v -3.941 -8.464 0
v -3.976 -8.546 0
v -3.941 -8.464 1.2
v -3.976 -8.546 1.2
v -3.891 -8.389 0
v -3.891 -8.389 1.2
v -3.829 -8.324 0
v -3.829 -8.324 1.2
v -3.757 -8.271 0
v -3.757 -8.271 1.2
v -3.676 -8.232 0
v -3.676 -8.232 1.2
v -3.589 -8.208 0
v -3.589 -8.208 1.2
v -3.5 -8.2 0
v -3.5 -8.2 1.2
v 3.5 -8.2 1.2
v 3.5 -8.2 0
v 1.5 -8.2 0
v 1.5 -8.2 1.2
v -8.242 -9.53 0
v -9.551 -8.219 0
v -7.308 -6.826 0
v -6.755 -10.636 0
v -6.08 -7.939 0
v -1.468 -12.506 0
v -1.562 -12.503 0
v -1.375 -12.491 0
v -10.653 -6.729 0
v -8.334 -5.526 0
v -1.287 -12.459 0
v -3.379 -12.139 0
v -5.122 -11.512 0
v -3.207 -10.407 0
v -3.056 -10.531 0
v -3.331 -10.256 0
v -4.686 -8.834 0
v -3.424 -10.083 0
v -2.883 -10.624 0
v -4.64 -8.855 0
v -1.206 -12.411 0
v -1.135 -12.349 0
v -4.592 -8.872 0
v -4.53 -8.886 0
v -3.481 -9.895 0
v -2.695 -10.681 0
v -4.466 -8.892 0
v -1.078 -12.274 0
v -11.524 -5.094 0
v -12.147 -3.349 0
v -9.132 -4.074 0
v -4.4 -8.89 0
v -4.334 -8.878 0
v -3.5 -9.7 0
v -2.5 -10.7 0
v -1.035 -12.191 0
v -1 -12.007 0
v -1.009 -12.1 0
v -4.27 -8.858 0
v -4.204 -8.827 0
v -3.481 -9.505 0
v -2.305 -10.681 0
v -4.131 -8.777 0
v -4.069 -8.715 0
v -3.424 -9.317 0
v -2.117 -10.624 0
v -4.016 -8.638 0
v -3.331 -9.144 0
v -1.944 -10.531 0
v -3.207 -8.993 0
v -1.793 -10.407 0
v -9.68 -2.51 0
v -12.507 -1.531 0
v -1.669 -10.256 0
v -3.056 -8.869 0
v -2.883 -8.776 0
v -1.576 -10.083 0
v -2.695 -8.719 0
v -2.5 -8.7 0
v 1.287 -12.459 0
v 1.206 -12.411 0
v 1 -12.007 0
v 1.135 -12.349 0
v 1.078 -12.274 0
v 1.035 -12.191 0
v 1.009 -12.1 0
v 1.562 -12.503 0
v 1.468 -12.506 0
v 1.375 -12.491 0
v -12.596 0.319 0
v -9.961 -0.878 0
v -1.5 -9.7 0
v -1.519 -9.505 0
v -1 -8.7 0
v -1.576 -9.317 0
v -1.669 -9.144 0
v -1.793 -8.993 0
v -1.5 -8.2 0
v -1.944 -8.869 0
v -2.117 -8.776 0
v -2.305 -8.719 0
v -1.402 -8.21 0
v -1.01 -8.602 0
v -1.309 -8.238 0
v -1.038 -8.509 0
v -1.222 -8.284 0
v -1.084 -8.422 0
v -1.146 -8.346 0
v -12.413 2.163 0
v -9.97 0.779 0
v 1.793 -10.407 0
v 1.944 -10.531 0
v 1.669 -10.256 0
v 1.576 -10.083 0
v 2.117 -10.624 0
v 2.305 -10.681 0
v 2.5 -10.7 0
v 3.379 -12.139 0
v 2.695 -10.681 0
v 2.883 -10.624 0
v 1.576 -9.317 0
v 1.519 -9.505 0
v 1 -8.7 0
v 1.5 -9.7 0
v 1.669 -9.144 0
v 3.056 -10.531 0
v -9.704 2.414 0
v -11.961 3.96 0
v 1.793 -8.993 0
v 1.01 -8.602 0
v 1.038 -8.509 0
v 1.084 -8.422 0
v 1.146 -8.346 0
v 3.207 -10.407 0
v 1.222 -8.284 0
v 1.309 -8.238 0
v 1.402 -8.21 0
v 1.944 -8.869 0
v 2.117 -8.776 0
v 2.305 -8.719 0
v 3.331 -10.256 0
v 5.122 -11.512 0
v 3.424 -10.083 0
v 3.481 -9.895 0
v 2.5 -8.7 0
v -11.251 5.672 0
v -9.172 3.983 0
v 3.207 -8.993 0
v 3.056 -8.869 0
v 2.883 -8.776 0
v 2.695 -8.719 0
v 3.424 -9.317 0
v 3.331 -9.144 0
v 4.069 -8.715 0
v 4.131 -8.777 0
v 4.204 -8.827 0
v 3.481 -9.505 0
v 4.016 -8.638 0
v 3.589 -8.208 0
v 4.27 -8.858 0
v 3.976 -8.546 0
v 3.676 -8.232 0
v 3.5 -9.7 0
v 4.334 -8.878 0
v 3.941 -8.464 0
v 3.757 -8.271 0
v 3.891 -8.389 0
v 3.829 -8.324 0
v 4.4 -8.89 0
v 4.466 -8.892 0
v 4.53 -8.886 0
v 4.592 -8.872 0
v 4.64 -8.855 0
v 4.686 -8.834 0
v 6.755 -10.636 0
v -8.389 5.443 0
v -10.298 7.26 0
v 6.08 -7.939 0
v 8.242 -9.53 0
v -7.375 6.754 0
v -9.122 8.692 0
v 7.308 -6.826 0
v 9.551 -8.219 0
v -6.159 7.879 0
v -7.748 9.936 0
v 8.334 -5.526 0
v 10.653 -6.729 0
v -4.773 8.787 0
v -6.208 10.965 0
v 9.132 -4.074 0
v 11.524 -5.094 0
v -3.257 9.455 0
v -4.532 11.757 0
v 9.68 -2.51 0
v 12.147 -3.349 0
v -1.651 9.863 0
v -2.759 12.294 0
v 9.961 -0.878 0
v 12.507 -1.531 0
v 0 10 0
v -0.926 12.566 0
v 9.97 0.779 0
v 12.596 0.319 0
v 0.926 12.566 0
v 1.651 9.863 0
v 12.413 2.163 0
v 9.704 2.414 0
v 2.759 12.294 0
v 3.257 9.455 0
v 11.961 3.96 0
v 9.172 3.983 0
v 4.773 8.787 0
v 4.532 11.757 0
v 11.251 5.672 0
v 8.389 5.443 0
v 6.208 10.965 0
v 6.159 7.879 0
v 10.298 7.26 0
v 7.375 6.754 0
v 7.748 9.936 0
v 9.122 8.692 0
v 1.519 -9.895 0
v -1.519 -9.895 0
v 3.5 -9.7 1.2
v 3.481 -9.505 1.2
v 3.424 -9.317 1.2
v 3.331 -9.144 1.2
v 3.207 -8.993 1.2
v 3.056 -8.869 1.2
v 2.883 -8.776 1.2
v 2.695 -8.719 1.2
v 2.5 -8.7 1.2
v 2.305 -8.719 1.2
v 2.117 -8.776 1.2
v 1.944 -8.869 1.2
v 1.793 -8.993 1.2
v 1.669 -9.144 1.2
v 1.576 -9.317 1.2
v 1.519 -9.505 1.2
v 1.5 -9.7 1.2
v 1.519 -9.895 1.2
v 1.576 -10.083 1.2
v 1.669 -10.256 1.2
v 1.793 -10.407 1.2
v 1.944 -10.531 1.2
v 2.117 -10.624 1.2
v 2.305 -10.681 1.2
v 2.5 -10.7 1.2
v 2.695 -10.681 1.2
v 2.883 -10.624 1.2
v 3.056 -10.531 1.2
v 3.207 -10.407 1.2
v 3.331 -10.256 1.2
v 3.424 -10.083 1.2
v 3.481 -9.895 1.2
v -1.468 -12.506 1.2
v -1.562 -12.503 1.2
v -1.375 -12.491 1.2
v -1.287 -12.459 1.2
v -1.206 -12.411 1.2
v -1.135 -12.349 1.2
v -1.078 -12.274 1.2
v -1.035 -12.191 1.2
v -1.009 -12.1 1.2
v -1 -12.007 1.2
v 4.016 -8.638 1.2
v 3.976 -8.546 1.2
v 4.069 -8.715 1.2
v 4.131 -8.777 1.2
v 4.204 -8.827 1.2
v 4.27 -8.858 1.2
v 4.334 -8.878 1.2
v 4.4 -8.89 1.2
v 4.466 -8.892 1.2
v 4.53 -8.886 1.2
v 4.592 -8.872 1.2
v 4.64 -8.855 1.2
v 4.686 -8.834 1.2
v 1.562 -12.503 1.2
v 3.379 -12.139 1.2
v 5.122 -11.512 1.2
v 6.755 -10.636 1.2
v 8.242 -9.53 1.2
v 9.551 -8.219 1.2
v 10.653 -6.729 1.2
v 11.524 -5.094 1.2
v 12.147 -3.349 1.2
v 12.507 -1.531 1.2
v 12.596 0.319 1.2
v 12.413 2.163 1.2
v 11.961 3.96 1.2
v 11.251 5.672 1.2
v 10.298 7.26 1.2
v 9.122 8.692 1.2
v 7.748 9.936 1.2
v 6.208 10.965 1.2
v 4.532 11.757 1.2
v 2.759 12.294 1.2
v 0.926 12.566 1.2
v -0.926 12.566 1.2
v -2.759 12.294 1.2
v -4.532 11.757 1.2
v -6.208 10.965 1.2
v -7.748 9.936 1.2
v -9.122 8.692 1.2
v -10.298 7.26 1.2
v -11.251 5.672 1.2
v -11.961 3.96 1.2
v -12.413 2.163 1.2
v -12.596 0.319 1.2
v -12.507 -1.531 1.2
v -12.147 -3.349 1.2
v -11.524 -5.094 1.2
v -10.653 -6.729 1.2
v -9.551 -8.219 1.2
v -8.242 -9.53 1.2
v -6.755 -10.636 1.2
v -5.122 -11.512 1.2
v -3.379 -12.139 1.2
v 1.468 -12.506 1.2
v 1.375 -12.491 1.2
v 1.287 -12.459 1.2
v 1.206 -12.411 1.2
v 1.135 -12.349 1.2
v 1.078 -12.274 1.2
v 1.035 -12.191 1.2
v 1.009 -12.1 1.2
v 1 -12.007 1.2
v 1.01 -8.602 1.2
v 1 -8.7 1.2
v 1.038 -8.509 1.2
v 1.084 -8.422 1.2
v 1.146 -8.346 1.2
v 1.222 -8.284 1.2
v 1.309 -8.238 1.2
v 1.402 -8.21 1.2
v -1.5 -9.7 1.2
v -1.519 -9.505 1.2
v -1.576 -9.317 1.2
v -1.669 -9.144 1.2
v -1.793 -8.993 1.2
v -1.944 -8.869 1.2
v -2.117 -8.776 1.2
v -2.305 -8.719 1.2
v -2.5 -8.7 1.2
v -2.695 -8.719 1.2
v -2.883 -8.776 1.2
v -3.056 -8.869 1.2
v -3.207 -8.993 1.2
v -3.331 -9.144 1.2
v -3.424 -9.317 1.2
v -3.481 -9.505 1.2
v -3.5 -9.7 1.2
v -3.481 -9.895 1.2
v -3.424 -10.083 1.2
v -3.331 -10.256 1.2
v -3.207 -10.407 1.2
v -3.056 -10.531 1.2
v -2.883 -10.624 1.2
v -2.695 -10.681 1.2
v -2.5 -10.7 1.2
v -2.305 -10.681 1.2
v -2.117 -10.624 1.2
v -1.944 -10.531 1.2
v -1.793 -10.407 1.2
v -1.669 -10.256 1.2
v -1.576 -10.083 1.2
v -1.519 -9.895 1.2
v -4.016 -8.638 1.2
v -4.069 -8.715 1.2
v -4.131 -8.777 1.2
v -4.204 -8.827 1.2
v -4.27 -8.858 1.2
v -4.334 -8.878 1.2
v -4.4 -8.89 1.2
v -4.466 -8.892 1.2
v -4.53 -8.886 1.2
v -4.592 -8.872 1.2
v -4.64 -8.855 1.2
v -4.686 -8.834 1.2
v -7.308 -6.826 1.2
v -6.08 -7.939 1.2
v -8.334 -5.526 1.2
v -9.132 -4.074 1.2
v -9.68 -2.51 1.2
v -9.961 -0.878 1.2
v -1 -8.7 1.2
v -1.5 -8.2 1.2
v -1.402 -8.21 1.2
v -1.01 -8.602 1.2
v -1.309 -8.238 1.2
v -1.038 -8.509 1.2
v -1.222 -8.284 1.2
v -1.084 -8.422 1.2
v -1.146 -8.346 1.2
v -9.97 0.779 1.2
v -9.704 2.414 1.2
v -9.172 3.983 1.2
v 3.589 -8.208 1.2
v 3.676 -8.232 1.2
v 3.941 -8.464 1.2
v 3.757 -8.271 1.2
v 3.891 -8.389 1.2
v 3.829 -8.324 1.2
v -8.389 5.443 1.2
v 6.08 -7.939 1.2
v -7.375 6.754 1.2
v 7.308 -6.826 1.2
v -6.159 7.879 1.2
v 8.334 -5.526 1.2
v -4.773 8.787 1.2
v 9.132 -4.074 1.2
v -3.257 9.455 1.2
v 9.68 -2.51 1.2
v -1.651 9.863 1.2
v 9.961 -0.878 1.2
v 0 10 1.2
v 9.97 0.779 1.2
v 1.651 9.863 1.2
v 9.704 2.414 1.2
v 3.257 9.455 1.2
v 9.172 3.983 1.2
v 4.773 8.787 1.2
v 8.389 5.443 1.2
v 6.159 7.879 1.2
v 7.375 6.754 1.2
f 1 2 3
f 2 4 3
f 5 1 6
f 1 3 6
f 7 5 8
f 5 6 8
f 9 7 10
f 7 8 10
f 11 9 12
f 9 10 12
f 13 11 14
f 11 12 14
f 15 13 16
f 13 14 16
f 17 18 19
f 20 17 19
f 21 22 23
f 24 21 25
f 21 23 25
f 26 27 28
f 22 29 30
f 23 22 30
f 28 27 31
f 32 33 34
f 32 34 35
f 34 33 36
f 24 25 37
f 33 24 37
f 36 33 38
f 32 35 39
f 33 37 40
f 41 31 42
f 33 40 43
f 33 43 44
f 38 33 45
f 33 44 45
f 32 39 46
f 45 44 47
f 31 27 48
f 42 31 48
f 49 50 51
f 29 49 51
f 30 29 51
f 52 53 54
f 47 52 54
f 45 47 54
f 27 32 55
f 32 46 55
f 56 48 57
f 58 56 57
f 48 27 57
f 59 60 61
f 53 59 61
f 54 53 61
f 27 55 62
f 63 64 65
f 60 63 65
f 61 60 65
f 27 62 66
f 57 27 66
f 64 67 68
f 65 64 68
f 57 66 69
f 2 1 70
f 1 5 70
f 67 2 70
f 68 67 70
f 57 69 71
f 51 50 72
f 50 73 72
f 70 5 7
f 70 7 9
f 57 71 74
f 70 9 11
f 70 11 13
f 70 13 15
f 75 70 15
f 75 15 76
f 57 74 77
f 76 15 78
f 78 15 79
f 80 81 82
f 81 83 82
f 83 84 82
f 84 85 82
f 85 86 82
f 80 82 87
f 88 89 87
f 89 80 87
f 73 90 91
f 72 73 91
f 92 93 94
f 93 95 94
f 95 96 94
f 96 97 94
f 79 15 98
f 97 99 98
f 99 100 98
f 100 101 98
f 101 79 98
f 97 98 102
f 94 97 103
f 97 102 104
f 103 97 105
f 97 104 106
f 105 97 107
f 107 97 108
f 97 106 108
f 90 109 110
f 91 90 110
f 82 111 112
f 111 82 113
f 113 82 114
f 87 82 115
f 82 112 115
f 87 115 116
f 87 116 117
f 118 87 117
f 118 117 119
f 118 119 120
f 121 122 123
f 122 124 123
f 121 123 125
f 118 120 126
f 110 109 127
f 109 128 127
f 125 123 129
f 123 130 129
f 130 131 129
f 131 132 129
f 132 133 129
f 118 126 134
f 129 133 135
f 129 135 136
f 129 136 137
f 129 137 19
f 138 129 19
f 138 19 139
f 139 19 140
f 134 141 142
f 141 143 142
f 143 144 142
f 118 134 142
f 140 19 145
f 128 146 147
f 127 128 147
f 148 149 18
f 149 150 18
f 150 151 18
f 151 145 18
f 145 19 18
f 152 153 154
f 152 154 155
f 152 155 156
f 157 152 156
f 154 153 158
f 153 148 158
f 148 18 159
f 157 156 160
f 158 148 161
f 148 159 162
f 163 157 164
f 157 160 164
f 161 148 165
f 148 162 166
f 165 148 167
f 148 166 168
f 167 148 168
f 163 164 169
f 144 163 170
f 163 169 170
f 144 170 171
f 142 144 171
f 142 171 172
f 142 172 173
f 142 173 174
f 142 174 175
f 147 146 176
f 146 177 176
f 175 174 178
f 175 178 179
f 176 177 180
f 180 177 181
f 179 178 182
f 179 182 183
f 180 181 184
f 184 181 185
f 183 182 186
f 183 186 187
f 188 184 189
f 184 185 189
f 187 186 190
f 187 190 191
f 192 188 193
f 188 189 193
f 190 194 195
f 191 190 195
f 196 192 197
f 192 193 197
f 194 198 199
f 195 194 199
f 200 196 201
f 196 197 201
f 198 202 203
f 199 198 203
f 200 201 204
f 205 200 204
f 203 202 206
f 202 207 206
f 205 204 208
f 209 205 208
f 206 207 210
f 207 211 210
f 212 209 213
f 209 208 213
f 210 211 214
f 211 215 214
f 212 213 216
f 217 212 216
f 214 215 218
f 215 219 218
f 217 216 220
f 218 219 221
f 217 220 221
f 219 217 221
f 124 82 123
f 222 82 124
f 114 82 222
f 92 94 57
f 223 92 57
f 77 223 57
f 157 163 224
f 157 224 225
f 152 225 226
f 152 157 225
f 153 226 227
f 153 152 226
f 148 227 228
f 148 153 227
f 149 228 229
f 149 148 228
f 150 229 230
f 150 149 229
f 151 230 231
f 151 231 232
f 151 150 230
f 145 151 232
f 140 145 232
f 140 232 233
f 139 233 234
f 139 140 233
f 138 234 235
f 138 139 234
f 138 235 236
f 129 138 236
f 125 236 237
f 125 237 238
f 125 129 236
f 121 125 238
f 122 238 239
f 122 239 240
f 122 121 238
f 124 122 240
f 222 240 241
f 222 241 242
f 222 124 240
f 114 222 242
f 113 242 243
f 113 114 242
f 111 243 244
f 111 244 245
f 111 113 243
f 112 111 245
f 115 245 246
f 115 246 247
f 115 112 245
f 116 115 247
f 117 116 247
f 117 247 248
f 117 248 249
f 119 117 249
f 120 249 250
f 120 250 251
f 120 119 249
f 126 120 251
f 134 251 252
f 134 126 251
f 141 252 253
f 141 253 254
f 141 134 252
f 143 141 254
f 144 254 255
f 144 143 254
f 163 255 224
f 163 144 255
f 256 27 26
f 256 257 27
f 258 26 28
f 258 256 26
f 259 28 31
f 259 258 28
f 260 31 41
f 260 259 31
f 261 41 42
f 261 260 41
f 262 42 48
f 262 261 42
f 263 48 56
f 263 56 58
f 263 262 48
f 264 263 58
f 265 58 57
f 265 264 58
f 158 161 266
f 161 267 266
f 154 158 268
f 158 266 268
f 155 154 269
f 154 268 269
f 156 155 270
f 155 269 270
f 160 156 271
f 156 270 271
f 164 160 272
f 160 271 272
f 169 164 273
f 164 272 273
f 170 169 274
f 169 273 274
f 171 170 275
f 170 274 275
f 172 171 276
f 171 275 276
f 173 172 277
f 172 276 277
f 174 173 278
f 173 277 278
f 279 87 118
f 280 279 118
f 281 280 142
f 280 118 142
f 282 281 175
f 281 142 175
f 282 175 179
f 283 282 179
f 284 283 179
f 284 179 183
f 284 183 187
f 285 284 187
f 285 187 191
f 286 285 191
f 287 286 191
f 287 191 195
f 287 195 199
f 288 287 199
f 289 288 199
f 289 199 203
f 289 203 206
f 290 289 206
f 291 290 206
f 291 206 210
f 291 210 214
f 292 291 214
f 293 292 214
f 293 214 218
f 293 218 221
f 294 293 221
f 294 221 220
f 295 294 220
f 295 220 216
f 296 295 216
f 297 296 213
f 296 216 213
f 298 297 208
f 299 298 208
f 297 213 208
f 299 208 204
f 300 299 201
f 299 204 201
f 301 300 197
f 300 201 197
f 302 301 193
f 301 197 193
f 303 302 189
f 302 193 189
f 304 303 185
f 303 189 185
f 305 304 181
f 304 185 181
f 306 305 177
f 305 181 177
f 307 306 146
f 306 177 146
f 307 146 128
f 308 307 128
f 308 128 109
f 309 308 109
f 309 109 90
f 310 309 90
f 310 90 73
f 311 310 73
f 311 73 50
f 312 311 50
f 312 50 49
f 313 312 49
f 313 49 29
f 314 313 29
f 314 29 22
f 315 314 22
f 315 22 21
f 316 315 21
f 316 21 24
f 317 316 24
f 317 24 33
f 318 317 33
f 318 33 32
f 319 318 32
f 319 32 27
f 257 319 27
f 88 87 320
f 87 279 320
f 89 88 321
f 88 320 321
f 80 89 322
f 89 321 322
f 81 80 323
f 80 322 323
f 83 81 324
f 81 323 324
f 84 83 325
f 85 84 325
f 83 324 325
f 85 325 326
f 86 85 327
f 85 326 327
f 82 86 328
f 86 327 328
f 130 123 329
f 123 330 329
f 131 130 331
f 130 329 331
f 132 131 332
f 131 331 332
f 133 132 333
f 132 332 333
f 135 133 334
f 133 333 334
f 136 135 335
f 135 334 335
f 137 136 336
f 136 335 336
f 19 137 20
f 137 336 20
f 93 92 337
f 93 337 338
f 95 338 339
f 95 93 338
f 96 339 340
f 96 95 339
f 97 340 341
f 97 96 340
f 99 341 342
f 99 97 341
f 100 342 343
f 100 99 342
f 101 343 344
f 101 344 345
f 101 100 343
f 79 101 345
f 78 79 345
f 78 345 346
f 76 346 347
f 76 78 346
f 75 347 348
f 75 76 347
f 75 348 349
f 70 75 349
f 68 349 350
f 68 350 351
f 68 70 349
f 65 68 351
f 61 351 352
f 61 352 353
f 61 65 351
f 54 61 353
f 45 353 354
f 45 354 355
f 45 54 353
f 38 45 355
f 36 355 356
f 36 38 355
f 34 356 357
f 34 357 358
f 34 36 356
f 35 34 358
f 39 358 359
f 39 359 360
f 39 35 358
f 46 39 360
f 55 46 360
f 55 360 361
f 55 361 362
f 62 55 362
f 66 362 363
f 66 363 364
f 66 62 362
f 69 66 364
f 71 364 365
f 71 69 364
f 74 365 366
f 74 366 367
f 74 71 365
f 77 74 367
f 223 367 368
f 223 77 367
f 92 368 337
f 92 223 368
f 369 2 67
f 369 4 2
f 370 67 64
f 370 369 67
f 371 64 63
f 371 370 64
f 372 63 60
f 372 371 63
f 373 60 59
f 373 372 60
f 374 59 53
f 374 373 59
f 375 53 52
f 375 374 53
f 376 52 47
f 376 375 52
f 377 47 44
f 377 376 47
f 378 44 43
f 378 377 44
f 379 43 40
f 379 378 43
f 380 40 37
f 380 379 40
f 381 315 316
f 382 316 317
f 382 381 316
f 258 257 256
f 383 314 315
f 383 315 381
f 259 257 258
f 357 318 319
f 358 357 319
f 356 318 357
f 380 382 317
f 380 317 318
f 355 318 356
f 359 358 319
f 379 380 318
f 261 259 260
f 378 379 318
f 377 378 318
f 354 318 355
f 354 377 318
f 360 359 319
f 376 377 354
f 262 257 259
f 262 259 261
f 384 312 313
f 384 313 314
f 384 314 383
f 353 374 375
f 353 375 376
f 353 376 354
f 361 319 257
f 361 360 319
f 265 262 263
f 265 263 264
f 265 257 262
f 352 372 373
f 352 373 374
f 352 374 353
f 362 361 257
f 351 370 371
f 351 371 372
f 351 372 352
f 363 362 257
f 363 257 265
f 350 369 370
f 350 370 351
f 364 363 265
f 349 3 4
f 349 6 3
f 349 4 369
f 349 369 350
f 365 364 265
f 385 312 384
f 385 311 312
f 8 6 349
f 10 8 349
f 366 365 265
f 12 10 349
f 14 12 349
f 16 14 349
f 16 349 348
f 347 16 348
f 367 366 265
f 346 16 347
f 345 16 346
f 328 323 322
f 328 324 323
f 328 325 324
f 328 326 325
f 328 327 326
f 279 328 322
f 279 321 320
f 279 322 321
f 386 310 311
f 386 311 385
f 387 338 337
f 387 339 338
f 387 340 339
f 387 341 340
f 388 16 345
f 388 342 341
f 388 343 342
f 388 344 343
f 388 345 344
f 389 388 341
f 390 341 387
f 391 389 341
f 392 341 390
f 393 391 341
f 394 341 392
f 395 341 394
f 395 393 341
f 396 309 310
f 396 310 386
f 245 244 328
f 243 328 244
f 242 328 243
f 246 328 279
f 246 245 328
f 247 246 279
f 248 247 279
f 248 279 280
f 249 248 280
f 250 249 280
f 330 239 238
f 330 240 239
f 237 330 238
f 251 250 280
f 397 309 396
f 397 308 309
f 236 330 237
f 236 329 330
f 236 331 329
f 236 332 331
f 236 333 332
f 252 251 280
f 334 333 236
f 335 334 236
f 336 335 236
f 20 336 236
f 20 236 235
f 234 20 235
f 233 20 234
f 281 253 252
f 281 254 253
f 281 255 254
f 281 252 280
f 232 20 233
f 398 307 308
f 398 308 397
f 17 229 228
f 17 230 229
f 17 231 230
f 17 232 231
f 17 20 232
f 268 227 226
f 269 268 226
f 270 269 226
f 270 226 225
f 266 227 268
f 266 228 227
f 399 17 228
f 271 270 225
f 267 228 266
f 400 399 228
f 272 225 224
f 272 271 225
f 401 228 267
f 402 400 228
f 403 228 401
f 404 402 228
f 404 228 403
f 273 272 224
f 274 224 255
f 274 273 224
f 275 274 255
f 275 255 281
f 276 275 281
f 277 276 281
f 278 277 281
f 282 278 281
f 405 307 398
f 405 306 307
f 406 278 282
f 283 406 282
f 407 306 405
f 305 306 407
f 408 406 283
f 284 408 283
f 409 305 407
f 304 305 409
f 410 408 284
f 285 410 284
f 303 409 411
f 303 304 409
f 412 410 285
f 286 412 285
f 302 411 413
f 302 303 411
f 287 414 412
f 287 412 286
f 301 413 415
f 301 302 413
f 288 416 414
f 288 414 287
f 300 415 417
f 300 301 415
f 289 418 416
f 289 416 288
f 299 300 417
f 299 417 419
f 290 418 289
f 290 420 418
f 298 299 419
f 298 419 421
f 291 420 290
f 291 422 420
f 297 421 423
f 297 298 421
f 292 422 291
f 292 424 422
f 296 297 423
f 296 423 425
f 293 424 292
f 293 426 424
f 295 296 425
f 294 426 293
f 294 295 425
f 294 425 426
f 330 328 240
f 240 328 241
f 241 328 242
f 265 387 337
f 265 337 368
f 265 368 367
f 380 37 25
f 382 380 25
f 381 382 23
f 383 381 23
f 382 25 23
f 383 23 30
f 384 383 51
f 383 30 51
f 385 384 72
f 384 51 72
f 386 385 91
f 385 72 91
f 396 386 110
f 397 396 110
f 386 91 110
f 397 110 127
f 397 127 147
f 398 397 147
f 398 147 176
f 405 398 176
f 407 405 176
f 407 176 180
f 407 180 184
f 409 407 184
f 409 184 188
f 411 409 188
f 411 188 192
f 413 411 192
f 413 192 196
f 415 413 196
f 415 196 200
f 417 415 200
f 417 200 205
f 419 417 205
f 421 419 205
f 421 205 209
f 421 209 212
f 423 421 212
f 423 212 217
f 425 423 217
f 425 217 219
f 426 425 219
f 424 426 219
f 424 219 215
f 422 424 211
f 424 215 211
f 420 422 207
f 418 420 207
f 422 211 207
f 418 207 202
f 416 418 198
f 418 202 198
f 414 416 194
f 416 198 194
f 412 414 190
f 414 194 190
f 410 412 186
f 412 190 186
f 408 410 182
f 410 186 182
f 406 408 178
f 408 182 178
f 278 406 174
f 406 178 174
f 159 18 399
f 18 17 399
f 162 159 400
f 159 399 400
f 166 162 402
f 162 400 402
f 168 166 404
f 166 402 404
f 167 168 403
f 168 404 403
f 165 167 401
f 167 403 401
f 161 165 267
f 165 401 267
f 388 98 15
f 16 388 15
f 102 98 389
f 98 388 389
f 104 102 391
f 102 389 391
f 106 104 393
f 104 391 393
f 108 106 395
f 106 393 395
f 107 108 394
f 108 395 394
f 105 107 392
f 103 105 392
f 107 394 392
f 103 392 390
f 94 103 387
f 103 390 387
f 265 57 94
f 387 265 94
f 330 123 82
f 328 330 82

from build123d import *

# Parameters (mm, degrees)
SZKIC1_R                    = 1
DODANIE_WYCI_GNI_CIE1_DEPTH = 1.2
ZAOKR_GLENIE2_R             = 0.5
ZAOKR_GLENIE3_R             = 0.5
ZAOKR_GLENIE4_R             = 0.5
ZAOKR_GLENIE5_R             = 0.5
ZAOKR_GLENIE6_R             = 0.5
ZAOKR_GLENIE7_R             = 0.5
ZAOKR_GLENIE8_R             = 0.5
ZAOKR_GLENIE9_R             = 0.5


with BuildPart() as part:
    # Szkic1 → Dodanie-wyciągnięcie1 (new body)
    with BuildSketch(Plane.XY):
        with BuildLine():
            Line((-1, -12.560254774), (-1, -8.2))
            Line((-1, -8.2), (-4, -8.2))
            Line((-4, -8.2), (-4, -9.16515139))
            ThreePointArc((-4, -9.16515139), (0, 10), (4, -9.16515139))
            Line((4, -9.16515139), (4, -8.2))
            Line((4, -8.2), (1, -8.2))
            Line((1, -8.2), (1, -12.560254774))
            ThreePointArc((1, -12.560254774), (0, 12.6), (-1, -12.560254774))
        make_face()
        with Locations((2.5, -9.7)):
            Circle(SZKIC1_R, mode=Mode.SUBTRACT)
        with Locations((-2.5, -9.7)):
            Circle(SZKIC1_R, mode=Mode.SUBTRACT)
    extrude(amount=DODANIE_WYCI_GNI_CIE1_DEPTH)

    # Zaokrąglenie2
    zaokr_glenie2_edges = [part.edges().sort_by_distance(p)[0] for p in [
        (1, -12.560254774, 0.6),
    ]]
    fillet(zaokr_glenie2_edges, radius=ZAOKR_GLENIE2_R)

    # Zaokrąglenie3
    zaokr_glenie3_edges = [part.edges().sort_by_distance(p)[0] for p in [
        (-1, -12.560254774, 0.6),
    ]]
    fillet(zaokr_glenie3_edges, radius=ZAOKR_GLENIE3_R)

    # Zaokrąglenie4
    zaokr_glenie4_edges = [part.edges().sort_by_distance(p)[0] for p in [
        (1, -8.2, 0.6),
    ]]
    fillet(zaokr_glenie4_edges, radius=ZAOKR_GLENIE4_R)

    # Zaokrąglenie5
    zaokr_glenie5_edges = [part.edges().sort_by_distance(p)[0] for p in [
        (4, -8.2, 0.6),
    ]]
    fillet(zaokr_glenie5_edges, radius=ZAOKR_GLENIE5_R)

    # Zaokrąglenie6
    zaokr_glenie6_edges = [part.edges().sort_by_distance(p)[0] for p in [
        (4, -9.16515139, 0.6),
    ]]
    fillet(zaokr_glenie6_edges, radius=ZAOKR_GLENIE6_R)

    # Zaokrąglenie7
    zaokr_glenie7_edges = [part.edges().sort_by_distance(p)[0] for p in [
        (-4, -8.2, 0.6),
    ]]
    fillet(zaokr_glenie7_edges, radius=ZAOKR_GLENIE7_R)

    # Zaokrąglenie8
    zaokr_glenie8_edges = [part.edges().sort_by_distance(p)[0] for p in [
        (-1, -8.2, 0.6),
    ]]
    fillet(zaokr_glenie8_edges, radius=ZAOKR_GLENIE8_R)

    # Zaokrąglenie9
    zaokr_glenie9_edges = [part.edges().sort_by_distance(p)[0] for p in [
        (-4, -9.16515139, 0.6),
    ]]
    fillet(zaokr_glenie9_edges, radius=ZAOKR_GLENIE9_R)


solid = part.part
